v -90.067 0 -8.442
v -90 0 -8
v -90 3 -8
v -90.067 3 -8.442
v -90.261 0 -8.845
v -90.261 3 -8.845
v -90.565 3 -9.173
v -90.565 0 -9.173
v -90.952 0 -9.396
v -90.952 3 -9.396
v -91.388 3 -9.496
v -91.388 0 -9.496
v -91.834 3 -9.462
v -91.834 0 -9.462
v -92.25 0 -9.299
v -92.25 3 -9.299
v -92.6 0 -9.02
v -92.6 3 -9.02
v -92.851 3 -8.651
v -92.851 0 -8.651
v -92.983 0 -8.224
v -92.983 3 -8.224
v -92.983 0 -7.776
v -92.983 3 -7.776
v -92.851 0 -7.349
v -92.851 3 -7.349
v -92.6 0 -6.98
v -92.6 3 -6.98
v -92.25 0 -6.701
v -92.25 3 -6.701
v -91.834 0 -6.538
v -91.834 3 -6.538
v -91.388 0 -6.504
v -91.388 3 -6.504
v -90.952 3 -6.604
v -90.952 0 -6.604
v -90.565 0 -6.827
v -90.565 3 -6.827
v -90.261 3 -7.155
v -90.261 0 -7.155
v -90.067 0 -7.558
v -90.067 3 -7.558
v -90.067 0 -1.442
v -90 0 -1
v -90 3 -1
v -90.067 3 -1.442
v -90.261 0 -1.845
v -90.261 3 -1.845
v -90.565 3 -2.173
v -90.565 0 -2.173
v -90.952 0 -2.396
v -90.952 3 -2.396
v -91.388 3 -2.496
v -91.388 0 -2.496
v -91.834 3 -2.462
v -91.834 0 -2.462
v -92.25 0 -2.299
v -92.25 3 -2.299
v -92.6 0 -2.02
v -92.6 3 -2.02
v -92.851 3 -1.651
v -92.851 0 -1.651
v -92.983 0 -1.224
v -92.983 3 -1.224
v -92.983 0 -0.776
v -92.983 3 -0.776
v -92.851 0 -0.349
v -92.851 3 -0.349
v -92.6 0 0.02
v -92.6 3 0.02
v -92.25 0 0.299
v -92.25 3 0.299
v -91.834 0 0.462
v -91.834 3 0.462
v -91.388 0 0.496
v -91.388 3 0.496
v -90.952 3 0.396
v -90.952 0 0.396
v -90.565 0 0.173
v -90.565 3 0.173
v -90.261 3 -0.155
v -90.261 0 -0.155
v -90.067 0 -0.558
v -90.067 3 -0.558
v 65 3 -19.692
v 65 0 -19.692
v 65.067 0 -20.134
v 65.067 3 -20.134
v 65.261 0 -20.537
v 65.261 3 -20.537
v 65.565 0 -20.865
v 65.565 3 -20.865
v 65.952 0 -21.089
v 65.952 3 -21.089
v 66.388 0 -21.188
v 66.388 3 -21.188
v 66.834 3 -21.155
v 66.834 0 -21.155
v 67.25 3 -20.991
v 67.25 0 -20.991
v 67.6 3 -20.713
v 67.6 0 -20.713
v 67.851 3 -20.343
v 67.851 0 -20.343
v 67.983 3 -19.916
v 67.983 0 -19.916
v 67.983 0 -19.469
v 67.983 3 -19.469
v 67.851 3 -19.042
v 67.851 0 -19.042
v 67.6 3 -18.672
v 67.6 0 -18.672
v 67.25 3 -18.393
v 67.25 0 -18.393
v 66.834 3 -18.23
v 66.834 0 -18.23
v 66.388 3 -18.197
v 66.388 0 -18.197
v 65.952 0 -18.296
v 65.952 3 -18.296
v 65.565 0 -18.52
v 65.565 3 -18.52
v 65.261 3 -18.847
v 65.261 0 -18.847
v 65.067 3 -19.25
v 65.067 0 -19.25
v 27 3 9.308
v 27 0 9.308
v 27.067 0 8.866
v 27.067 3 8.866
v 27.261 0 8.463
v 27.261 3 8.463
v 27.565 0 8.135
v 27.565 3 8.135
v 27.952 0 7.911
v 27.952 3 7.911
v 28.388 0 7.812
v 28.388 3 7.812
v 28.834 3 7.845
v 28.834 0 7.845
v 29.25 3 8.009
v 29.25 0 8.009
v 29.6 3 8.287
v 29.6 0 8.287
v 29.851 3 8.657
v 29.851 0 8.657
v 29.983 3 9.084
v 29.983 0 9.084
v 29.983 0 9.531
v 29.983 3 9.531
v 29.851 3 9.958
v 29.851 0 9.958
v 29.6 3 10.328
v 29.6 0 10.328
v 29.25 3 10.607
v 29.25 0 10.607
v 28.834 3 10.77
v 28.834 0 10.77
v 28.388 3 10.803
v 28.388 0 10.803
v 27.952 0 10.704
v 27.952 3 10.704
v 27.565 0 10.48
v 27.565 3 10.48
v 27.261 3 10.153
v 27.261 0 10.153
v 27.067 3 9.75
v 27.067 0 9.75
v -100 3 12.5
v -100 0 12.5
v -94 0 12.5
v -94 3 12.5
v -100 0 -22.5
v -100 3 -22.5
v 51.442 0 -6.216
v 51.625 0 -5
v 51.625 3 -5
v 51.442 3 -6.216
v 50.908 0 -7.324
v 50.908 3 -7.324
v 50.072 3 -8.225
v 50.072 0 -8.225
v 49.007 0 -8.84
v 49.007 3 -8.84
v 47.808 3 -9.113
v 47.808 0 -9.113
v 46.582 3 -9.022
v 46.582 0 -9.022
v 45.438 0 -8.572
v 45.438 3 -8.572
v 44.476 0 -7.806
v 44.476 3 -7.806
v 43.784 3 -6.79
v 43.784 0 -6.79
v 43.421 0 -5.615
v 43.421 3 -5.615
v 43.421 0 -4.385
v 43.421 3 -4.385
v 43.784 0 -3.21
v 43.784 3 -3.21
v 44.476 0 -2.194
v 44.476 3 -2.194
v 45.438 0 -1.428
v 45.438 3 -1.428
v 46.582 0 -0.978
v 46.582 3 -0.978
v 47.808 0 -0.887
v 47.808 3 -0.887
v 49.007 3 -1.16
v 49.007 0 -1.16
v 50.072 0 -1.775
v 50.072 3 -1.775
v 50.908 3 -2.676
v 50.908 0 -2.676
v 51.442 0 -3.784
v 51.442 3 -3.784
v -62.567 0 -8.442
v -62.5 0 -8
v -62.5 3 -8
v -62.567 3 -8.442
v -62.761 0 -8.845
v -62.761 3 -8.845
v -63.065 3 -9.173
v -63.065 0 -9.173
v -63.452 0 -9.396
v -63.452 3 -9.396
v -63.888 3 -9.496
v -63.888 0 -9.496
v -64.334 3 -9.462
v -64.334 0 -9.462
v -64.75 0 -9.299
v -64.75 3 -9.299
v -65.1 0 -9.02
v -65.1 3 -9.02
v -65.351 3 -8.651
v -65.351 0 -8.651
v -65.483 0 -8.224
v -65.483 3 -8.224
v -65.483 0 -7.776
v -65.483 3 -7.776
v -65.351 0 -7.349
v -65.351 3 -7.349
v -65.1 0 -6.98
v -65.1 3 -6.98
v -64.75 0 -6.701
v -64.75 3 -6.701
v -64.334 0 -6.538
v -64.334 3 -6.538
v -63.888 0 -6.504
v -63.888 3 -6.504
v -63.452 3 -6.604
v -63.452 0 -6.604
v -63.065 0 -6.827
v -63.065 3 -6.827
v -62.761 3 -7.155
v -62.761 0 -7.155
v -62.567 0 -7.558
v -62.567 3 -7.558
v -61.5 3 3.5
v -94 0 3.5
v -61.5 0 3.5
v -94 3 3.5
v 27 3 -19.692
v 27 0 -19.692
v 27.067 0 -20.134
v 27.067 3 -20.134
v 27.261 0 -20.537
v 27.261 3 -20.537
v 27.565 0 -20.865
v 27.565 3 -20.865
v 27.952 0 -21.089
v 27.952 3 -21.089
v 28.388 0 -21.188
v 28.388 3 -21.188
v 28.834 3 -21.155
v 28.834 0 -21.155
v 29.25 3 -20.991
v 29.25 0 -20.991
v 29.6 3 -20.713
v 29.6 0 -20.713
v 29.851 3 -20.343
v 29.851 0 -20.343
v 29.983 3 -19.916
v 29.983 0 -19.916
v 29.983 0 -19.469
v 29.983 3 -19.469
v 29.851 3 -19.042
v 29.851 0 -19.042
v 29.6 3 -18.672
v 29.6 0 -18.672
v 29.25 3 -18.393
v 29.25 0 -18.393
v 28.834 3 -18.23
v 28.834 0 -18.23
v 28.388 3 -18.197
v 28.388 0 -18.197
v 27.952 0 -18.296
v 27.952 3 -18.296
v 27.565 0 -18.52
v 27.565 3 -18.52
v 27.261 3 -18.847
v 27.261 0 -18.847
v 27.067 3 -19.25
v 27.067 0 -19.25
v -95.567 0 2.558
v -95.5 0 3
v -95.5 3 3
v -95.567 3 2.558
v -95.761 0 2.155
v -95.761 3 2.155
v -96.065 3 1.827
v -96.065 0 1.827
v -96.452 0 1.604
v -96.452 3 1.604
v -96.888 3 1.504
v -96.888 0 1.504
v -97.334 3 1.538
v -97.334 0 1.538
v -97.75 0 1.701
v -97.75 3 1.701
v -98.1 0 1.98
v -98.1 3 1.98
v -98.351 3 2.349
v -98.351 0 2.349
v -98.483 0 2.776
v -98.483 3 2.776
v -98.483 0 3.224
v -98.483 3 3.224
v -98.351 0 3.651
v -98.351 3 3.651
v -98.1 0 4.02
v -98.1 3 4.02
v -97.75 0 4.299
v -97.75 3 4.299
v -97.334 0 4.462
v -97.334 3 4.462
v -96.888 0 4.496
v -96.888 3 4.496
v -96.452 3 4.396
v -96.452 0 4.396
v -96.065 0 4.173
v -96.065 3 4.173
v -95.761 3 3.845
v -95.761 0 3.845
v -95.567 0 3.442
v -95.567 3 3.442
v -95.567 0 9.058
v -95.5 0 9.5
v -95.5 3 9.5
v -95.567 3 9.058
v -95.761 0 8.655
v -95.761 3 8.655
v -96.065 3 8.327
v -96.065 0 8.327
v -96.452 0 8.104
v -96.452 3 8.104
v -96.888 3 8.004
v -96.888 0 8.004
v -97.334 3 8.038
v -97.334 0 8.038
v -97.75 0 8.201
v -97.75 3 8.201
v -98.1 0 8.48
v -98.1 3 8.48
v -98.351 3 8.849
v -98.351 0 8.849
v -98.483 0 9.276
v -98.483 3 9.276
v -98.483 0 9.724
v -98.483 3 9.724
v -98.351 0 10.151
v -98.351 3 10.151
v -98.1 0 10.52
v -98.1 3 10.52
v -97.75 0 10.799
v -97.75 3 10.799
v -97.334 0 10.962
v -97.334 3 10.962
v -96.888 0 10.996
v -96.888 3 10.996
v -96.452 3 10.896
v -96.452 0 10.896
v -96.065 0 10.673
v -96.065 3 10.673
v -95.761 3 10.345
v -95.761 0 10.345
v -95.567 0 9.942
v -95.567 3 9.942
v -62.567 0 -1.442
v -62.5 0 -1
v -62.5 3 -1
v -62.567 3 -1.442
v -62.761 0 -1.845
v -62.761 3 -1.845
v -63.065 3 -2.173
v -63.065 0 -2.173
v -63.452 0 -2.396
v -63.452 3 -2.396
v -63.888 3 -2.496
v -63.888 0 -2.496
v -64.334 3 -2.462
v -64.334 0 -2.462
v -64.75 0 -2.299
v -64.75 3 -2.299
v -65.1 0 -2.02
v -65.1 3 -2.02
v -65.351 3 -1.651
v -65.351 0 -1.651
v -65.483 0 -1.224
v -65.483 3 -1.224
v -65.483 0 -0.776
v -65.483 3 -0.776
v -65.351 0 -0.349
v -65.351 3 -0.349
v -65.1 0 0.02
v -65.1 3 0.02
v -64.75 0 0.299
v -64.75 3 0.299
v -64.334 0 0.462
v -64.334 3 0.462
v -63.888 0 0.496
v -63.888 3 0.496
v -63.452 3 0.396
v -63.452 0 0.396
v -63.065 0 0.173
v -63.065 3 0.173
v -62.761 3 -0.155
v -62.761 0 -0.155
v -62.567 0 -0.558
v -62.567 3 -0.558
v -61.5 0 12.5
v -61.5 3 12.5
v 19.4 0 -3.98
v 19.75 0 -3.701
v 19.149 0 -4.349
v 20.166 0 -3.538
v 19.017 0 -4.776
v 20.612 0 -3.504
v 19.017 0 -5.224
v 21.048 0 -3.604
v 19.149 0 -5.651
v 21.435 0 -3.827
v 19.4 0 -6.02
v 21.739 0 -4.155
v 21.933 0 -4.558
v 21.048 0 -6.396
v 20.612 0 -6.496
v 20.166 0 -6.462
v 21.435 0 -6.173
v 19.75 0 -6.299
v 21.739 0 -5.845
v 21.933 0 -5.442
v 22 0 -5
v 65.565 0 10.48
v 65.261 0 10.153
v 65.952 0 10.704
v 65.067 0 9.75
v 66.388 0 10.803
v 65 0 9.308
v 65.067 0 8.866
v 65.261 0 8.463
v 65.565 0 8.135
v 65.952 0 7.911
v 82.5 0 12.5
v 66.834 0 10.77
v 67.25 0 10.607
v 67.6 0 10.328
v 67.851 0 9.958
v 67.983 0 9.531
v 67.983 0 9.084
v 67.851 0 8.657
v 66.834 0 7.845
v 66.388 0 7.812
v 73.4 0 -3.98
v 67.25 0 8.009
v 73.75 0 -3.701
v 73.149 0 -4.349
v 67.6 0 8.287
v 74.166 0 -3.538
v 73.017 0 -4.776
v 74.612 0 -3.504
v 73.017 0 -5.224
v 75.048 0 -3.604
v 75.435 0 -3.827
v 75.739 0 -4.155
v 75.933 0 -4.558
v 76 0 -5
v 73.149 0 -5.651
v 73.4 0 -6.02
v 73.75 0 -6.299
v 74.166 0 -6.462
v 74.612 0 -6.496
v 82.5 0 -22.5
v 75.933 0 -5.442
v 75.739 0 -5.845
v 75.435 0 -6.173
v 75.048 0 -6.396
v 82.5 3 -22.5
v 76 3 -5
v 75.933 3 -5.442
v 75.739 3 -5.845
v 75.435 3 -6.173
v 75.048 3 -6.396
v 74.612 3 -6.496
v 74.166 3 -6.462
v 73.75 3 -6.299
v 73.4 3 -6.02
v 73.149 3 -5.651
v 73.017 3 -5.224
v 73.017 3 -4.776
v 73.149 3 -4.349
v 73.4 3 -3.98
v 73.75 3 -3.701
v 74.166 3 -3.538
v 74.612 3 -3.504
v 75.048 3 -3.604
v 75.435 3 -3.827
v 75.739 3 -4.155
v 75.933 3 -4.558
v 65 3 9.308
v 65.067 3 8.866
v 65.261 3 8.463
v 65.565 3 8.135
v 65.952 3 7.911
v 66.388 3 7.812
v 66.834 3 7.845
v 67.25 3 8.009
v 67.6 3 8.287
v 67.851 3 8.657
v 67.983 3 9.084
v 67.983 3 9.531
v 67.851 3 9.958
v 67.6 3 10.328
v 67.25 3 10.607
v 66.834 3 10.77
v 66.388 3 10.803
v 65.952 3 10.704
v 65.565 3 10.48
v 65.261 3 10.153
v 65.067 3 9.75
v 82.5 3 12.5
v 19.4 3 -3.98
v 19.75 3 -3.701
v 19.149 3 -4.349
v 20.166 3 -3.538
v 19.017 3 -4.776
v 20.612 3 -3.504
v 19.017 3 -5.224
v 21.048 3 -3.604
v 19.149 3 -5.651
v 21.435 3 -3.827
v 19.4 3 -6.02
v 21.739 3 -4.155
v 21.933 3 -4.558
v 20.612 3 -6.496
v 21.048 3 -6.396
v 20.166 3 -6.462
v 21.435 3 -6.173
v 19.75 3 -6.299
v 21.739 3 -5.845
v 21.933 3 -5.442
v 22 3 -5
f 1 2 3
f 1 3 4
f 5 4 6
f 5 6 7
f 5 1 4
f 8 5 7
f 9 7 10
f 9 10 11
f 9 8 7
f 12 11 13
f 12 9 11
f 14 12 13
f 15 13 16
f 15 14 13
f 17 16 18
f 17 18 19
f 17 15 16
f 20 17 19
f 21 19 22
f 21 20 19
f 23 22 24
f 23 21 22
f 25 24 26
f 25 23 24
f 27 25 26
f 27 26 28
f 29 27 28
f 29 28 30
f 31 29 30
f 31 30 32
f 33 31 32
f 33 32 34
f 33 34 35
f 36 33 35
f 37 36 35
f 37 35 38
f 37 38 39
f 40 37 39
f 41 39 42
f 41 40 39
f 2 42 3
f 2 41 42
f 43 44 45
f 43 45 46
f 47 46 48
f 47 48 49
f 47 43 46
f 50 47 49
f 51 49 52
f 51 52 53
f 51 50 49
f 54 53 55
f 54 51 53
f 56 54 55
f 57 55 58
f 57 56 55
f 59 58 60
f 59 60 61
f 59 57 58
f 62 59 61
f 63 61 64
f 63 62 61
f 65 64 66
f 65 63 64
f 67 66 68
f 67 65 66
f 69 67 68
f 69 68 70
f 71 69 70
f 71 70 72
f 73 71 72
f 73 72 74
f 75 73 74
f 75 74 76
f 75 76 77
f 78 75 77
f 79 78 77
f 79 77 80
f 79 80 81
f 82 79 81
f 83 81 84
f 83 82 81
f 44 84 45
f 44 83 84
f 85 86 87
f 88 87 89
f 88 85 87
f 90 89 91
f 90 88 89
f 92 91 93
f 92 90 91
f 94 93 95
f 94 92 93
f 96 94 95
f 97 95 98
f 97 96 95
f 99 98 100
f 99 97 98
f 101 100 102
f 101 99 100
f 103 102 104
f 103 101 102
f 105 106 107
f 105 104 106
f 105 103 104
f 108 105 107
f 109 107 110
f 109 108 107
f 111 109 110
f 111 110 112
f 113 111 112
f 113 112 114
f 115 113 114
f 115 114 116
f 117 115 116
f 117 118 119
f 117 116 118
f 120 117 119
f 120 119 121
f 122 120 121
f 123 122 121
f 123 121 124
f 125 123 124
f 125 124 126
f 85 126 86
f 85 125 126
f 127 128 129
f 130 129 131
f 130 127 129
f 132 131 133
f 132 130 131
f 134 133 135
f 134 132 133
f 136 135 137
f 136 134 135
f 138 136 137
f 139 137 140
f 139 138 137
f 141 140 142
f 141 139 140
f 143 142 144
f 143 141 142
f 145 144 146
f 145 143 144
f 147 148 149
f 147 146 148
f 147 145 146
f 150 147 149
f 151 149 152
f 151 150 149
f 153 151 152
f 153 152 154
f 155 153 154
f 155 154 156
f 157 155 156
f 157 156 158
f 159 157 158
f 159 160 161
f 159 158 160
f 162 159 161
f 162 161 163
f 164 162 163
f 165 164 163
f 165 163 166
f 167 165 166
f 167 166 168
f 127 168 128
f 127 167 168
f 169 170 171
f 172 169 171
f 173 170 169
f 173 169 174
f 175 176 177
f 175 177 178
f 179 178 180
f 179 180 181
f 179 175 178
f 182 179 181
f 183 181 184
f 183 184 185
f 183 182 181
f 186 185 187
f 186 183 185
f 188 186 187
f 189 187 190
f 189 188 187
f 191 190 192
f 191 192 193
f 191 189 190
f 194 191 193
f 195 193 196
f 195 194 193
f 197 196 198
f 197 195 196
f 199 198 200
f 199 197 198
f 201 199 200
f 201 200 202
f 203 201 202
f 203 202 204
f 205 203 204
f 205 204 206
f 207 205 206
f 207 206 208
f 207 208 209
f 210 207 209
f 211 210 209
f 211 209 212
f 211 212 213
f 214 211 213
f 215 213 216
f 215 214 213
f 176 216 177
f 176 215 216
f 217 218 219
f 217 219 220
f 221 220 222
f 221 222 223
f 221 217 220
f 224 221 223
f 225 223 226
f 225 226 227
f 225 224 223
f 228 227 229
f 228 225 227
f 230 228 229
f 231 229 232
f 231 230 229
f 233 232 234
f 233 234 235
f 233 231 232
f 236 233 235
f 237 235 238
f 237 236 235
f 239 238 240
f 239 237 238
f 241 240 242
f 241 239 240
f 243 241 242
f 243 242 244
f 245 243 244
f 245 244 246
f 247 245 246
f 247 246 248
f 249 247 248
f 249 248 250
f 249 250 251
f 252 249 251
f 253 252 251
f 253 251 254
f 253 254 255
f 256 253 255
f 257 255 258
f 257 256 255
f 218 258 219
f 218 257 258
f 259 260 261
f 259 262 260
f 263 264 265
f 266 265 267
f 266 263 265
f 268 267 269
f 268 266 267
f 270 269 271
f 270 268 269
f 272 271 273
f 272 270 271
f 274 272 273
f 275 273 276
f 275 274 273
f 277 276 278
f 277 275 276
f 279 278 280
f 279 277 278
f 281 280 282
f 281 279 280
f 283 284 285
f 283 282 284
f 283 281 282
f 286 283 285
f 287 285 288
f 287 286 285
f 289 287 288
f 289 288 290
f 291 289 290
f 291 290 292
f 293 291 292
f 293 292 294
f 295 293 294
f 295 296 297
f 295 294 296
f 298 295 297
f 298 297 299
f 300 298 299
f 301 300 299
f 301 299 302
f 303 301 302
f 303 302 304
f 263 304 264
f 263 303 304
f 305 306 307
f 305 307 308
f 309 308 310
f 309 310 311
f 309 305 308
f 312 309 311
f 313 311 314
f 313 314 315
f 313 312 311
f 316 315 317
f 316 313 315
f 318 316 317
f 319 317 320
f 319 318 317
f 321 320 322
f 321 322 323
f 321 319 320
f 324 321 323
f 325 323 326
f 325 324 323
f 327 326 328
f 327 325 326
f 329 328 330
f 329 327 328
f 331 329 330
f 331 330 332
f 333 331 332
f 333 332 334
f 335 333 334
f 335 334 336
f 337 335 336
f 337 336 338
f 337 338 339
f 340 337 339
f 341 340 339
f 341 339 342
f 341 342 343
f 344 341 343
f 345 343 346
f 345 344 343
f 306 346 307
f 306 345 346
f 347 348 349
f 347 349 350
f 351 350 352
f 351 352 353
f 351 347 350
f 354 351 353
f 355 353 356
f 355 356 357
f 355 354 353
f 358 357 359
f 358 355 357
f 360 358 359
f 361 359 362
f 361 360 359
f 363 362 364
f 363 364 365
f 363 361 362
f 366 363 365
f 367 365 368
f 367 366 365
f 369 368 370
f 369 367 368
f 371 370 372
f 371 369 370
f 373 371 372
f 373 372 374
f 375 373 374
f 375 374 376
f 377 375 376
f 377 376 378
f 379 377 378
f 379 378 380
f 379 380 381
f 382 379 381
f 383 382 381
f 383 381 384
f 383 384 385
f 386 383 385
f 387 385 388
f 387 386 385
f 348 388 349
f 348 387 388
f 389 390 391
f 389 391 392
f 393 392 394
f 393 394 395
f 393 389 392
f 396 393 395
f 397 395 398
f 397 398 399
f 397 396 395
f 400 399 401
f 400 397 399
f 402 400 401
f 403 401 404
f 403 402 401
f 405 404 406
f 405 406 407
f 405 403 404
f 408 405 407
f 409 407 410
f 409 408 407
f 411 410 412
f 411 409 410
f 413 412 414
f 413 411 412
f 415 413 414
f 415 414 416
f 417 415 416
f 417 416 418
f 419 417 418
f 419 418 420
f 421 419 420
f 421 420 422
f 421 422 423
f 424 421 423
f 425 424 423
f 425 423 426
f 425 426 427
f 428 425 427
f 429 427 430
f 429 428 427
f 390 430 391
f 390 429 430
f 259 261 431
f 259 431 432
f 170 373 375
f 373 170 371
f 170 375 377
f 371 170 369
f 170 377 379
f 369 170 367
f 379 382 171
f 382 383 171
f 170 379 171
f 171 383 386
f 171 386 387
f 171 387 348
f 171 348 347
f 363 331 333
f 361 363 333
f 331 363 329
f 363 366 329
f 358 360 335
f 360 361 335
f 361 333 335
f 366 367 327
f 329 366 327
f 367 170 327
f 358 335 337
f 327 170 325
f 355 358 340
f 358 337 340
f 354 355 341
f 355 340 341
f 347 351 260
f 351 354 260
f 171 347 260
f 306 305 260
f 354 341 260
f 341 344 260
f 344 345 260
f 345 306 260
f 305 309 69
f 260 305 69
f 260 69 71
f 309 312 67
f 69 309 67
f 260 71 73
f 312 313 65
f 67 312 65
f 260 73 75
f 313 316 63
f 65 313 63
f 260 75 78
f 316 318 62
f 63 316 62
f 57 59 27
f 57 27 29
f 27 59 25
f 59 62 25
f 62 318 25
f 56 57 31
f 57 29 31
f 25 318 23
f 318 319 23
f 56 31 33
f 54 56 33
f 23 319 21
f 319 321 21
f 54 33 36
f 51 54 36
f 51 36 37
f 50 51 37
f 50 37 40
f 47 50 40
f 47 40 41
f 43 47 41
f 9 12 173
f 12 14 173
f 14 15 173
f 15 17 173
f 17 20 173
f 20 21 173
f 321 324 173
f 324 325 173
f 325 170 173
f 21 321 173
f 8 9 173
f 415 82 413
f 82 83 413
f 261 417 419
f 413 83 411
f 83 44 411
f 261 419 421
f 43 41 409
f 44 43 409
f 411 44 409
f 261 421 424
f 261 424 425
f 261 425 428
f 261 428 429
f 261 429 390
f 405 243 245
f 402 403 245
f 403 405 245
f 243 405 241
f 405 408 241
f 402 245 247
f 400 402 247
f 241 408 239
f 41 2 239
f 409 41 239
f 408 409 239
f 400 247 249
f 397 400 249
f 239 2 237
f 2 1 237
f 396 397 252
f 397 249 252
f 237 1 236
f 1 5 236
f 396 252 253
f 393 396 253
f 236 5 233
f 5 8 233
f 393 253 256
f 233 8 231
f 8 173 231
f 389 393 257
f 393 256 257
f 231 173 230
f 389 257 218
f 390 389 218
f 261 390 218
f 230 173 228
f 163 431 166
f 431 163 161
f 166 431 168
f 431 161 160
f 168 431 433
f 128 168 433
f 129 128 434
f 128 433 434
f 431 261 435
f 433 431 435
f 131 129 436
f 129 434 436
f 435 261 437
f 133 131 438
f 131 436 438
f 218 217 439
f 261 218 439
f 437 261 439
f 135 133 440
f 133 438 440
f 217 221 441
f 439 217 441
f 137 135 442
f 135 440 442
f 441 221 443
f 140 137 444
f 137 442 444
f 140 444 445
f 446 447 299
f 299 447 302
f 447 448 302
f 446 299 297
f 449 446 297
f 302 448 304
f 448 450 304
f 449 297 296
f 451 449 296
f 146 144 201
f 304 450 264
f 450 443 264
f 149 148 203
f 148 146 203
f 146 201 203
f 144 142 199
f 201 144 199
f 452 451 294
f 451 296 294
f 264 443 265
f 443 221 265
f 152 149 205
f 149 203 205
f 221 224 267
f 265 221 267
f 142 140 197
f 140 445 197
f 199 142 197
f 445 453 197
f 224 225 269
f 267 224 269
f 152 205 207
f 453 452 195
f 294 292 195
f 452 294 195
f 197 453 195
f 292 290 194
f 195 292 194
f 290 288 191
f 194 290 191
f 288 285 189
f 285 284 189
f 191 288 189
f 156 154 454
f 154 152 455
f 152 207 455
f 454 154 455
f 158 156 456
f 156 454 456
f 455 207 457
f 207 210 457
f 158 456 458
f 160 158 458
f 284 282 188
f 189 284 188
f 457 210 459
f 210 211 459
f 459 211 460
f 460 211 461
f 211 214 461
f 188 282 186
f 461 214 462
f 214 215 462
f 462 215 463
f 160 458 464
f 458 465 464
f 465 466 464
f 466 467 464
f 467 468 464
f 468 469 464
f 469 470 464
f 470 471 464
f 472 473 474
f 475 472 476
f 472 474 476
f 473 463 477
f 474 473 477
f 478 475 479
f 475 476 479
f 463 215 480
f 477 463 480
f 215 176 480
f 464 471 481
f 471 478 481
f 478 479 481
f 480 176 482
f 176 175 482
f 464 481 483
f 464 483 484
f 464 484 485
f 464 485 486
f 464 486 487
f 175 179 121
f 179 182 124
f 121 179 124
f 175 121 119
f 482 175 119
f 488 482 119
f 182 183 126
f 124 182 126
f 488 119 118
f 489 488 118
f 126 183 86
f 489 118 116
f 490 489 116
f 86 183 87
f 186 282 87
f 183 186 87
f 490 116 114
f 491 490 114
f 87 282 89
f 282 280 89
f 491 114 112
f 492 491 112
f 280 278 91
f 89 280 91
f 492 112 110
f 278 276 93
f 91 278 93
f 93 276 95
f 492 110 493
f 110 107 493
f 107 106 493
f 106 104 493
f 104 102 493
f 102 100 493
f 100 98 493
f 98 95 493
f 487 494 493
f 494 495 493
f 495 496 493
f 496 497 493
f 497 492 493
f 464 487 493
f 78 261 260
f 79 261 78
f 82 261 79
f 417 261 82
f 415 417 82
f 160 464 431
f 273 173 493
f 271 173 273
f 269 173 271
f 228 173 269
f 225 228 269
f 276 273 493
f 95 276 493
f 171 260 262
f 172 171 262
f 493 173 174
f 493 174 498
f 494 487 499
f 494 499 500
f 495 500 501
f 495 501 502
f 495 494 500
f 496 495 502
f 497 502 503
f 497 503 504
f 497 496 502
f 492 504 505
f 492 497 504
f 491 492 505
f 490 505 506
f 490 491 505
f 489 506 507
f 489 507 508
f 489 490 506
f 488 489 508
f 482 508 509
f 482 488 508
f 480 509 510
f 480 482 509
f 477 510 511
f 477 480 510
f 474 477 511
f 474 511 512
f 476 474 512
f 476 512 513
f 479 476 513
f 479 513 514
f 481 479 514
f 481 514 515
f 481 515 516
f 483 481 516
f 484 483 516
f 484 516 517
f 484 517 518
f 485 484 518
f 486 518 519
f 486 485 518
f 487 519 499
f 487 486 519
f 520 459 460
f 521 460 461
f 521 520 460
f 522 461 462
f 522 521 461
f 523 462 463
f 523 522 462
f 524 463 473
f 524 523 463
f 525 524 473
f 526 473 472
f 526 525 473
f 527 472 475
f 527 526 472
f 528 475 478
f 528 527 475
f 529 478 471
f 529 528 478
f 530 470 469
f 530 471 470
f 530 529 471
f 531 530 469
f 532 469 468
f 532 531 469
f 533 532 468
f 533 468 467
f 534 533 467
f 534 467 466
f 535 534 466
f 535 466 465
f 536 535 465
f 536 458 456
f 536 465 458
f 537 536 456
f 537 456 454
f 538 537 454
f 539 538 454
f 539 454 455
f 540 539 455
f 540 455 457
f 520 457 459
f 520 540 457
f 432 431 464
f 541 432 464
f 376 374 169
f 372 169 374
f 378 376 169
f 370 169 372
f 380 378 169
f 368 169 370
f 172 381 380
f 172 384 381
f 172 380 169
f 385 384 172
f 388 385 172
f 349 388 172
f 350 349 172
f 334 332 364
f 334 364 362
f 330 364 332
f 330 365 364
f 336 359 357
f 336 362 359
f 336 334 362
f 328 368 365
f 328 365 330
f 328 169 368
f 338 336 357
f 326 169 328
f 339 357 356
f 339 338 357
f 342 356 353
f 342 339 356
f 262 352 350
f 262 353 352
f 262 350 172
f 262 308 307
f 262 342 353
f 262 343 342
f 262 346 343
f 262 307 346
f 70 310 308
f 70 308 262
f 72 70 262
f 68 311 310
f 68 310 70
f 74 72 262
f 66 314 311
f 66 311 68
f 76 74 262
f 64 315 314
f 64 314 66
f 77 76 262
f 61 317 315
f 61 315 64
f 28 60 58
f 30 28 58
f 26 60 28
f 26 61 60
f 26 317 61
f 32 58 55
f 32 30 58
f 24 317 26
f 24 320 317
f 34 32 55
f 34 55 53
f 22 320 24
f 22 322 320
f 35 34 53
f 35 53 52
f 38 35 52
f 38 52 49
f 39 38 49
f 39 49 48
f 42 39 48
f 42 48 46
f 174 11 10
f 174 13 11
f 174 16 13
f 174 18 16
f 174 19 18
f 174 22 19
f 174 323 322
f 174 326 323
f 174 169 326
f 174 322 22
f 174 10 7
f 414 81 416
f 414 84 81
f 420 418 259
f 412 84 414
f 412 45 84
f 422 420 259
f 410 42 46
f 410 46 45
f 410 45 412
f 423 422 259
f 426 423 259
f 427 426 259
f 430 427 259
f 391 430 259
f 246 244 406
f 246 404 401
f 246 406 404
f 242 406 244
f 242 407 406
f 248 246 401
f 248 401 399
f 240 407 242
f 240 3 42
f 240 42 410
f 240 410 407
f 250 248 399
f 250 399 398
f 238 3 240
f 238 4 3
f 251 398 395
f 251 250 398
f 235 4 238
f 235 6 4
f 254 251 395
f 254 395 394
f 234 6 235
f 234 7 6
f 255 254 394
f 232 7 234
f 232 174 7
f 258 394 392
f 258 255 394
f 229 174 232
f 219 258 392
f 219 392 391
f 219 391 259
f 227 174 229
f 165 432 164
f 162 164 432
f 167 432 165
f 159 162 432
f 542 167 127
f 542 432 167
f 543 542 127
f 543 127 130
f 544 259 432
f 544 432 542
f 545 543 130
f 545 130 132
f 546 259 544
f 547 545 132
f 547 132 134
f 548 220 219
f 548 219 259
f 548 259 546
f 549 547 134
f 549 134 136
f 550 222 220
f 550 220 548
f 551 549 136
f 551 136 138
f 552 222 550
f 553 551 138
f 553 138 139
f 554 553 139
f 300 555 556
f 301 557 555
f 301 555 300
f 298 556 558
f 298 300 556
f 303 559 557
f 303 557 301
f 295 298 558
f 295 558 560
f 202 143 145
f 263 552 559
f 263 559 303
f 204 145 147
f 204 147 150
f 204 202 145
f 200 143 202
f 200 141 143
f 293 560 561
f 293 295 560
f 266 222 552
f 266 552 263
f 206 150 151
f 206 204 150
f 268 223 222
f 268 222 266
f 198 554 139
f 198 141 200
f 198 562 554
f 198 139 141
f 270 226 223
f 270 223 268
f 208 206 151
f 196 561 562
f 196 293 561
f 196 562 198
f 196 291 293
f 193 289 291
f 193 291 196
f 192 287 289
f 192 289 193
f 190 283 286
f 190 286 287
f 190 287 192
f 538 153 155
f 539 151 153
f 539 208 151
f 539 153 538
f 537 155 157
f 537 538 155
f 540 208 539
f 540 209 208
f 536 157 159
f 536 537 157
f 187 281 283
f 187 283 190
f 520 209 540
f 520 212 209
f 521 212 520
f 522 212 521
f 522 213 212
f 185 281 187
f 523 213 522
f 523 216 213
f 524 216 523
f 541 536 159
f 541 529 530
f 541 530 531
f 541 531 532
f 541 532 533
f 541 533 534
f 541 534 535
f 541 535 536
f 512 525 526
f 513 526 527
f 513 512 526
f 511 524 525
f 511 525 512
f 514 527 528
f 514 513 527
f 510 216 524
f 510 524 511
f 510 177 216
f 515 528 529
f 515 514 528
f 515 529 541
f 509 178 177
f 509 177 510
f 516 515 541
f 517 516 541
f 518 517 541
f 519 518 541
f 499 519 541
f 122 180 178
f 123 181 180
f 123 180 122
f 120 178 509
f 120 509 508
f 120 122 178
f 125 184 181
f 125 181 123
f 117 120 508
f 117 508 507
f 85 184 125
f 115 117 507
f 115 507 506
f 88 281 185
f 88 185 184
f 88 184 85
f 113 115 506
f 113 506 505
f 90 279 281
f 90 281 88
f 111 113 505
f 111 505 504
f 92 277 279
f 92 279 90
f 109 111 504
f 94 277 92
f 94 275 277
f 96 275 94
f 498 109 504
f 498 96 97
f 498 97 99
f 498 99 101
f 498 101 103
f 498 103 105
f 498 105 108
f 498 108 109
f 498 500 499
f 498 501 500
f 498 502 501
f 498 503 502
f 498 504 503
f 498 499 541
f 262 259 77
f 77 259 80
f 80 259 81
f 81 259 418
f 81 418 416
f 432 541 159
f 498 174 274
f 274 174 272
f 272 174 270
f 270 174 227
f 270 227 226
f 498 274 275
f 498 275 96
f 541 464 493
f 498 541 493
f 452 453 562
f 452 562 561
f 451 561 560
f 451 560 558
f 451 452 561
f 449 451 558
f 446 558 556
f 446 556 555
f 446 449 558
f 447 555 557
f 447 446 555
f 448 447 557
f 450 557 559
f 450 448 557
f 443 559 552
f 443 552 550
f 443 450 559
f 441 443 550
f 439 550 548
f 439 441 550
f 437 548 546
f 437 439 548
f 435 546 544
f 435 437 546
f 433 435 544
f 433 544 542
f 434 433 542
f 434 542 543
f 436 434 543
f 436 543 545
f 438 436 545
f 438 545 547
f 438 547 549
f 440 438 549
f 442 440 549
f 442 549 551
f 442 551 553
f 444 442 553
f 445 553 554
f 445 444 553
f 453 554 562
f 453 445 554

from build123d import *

# Parameters (mm, degrees)
SKETCH1_W           = 182.5
SKETCH1_H           = 35
SKETCH1_R           = 4.125
SKETCH1_R_2         = 1.5
BOSS_EXTRUDE1_DEPTH = 3
CUT_EXTRUDE3_START  = 3.5
SKETCH2_W           = 3
SKETCH2_H           = 9.897866997
SKETCH2_W_2         = 27.5
SKETCH2_W_3         = 2
CUT_EXTRUDE3_DEPTH  = 9
SKETCH3_R           = 1.5
CUT_EXTRUDE7_DEPTH  = 10


with BuildPart() as part:
    # Sketch1 → Boss-Extrude1 (new body)
    with BuildSketch(Plane(origin=(0, 0, 0), x_dir=(1, 0, 0), z_dir=(0, 1, 0))):
        with Locations((-8.75, 5)):
            Rectangle(SKETCH1_W, SKETCH1_H)
        with Locations((47.5, 5)):
            Circle(SKETCH1_R, mode=Mode.SUBTRACT)
        with Locations((74.5, 5)):
            Circle(SKETCH1_R_2, mode=Mode.SUBTRACT)
        with Locations((20.5, 5)):
            Circle(SKETCH1_R_2, mode=Mode.SUBTRACT)
        with Locations((-97, -9.5)):
            Circle(SKETCH1_R_2, mode=Mode.SUBTRACT)
        with Locations((-97, -3)):
            Circle(SKETCH1_R_2, mode=Mode.SUBTRACT)
        with Locations((-91.5, 8)):
            Circle(SKETCH1_R_2, mode=Mode.SUBTRACT)
        with Locations((-64, 8)):
            Circle(SKETCH1_R_2, mode=Mode.SUBTRACT)
        with Locations((-64, 1)):
            Circle(SKETCH1_R_2, mode=Mode.SUBTRACT)
        with Locations((-91.5, 1)):
            Circle(SKETCH1_R_2, mode=Mode.SUBTRACT)
    extrude(amount=BOSS_EXTRUDE1_DEPTH)

    # Sketch2 → Cut-Extrude3 (cut)
    with BuildSketch(Plane.XY.offset(CUT_EXTRUDE3_START)):
        with Locations((-90.5, 1.550857661)):
            Rectangle(SKETCH2_W, SKETCH2_H)
        with Locations((-75.25, 1.550857661)):
            Rectangle(SKETCH2_W_2, SKETCH2_H)
        with Locations((-93, 1.550857661)):
            Rectangle(SKETCH2_W_3, SKETCH2_H)
    extrude(amount=CUT_EXTRUDE3_DEPTH, mode=Mode.SUBTRACT)

    # Sketch3 → Cut-Extrude7 (cut)
    with BuildSketch(Plane(origin=(0, 3, 0), x_dir=(-1, 0, 0), z_dir=(0, -1, 0))):
        with Locations((-66.5, -9.307637977)):
            Circle(SKETCH3_R)
        with Locations((-66.5, 19.692362023)):
            Circle(SKETCH3_R)
        with Locations((-28.5, 19.692362023)):
            Circle(SKETCH3_R)
        with Locations((-28.5, -9.307637977)):
            Circle(SKETCH3_R)
    extrude(amount=CUT_EXTRUDE7_DEPTH, mode=Mode.SUBTRACT)


solid = part.part
